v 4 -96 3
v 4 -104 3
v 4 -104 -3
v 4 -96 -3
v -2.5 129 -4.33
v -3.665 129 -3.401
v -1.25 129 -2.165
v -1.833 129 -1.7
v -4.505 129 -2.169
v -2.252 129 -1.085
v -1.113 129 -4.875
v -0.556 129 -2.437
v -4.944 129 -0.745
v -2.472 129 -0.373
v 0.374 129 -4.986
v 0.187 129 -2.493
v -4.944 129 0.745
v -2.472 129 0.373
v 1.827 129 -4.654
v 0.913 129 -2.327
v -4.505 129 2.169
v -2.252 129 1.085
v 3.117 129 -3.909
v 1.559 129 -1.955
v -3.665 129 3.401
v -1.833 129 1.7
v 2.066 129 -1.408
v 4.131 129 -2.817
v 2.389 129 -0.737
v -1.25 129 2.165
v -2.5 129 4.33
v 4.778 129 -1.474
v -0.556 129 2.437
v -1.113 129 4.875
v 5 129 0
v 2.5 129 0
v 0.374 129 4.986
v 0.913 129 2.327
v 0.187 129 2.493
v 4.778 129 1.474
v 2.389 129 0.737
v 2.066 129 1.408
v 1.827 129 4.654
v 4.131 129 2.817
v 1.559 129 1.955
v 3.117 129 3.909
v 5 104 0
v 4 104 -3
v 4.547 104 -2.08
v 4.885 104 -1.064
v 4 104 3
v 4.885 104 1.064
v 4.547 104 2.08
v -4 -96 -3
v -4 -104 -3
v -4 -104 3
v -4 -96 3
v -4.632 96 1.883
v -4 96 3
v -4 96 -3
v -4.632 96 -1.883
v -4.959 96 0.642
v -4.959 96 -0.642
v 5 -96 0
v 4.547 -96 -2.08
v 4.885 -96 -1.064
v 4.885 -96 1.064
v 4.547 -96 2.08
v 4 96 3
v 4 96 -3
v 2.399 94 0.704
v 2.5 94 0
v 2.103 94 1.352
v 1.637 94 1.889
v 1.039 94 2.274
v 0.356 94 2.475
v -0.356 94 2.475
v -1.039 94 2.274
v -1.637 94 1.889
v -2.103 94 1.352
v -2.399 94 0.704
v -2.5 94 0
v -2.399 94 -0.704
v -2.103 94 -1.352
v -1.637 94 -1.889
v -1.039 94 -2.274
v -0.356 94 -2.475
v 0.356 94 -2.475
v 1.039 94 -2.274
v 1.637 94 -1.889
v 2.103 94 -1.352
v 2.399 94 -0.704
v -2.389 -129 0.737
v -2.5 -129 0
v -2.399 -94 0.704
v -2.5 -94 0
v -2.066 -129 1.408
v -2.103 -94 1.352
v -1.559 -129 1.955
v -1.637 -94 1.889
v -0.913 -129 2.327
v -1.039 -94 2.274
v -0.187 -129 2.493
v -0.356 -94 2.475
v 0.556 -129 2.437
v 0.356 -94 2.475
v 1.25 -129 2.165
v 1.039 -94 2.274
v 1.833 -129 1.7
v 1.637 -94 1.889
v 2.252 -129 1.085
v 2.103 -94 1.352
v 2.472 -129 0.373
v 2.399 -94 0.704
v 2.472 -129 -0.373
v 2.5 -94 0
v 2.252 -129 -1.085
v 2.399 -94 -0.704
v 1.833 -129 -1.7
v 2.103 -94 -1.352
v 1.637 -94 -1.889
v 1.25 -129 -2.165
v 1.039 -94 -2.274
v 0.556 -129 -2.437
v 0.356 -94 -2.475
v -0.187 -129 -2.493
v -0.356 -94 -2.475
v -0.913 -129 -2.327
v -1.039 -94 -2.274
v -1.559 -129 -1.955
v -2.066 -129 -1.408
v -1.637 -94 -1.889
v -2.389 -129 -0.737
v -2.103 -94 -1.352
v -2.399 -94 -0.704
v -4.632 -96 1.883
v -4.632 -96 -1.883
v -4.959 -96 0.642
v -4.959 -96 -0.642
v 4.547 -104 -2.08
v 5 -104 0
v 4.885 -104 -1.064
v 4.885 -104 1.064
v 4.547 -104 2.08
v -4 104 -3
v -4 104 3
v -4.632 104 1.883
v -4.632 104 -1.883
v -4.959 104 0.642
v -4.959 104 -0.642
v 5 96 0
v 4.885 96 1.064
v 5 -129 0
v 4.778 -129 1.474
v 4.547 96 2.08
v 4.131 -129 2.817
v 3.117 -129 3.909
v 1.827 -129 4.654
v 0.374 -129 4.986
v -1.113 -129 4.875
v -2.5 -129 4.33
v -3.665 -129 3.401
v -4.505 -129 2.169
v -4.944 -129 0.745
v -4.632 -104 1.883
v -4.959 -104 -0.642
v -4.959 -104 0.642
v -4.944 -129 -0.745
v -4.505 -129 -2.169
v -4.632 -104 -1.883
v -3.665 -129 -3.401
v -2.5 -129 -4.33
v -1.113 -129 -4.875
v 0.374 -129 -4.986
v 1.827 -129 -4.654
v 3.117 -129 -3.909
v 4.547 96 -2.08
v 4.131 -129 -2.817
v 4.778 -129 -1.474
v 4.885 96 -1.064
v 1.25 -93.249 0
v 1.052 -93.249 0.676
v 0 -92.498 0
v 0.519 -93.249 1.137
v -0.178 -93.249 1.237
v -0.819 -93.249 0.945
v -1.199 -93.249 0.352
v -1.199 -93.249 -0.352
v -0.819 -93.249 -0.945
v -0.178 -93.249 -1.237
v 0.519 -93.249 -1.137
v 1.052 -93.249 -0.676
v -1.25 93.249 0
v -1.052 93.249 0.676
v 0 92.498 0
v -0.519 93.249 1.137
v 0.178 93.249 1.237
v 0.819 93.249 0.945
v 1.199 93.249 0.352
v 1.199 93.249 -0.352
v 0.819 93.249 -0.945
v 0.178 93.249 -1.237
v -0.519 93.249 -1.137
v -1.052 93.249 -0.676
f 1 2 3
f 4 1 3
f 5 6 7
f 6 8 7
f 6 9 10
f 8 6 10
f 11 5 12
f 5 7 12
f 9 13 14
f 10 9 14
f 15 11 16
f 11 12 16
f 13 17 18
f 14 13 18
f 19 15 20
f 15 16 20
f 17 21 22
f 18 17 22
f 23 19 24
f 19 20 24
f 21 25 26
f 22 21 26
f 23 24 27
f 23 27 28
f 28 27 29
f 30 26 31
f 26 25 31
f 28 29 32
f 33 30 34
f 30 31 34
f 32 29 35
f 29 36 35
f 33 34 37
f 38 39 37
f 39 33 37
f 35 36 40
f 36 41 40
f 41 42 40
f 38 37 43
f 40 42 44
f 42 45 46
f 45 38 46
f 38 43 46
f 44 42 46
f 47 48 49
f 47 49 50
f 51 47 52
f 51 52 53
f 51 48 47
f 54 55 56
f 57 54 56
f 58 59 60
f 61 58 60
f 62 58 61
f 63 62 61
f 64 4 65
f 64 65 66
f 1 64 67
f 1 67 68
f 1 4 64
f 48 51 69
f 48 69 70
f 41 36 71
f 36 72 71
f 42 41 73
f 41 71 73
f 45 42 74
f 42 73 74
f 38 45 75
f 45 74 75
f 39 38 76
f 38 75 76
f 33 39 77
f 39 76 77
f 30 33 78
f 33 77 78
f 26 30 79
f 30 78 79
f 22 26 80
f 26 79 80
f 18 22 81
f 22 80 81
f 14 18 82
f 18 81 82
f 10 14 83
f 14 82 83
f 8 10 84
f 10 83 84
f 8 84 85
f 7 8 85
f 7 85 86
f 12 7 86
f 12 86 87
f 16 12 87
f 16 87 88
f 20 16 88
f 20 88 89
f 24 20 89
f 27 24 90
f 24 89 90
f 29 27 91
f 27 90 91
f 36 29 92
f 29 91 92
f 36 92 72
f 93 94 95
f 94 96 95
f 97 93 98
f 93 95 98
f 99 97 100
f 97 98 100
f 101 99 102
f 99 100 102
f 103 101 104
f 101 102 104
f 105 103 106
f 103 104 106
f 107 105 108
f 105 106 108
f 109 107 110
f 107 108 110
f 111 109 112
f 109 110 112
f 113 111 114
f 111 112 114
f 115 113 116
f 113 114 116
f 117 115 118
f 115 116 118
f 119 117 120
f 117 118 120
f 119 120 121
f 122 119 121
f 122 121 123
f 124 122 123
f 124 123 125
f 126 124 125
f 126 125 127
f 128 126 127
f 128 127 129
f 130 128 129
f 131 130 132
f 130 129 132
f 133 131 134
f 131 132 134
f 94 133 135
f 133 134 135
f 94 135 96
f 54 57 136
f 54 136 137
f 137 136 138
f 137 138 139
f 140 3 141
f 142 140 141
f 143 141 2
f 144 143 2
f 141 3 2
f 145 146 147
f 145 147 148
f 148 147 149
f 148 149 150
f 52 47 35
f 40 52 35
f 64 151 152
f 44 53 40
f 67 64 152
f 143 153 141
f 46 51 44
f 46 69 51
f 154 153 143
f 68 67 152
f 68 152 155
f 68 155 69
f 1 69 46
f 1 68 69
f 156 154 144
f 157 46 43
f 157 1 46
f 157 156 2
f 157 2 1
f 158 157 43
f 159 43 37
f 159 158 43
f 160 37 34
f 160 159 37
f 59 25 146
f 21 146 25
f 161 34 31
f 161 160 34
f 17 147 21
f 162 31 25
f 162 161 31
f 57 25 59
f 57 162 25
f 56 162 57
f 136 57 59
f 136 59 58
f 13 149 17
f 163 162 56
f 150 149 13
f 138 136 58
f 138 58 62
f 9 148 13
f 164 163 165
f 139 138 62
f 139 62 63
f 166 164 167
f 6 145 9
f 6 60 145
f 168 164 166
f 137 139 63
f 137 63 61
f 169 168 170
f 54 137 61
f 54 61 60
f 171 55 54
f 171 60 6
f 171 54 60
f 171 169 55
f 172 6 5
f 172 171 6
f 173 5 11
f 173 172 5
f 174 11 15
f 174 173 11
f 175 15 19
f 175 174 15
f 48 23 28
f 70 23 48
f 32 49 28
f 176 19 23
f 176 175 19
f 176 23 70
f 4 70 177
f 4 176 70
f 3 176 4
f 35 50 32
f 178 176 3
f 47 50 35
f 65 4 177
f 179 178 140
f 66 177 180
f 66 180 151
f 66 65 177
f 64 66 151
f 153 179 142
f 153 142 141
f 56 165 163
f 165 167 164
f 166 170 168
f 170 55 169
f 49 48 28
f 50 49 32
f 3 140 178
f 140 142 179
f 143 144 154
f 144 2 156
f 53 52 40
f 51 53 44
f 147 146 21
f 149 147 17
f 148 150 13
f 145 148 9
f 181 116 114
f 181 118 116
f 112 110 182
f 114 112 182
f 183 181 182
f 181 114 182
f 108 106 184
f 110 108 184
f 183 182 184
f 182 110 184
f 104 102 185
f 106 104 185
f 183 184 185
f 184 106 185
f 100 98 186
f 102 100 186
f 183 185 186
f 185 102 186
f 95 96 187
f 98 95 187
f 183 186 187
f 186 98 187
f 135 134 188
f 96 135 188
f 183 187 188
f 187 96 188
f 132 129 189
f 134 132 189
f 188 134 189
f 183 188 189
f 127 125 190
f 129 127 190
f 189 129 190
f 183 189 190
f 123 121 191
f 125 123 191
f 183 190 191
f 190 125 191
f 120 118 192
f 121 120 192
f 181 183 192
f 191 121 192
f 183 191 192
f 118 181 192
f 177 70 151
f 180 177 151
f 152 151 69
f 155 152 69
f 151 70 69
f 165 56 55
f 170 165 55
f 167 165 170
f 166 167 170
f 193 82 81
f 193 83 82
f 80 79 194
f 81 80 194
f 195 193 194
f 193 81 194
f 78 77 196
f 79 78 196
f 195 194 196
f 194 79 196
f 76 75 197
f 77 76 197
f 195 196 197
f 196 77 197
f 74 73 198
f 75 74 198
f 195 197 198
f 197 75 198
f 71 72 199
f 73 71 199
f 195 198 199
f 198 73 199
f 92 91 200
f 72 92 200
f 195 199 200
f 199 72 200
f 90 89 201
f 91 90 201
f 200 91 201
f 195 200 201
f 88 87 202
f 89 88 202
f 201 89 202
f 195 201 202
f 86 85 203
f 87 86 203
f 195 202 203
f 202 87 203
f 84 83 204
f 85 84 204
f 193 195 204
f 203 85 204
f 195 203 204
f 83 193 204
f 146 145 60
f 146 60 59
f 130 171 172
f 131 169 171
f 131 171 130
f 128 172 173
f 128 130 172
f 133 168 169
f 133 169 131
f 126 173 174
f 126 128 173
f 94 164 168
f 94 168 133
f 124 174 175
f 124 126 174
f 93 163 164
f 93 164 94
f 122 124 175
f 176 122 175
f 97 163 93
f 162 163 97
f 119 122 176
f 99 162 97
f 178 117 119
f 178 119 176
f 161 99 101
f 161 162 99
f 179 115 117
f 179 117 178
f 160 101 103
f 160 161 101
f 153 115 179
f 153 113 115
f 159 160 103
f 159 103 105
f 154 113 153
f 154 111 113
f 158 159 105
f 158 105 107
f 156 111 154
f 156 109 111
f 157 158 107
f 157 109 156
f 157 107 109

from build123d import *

# Parameters (mm, degrees)
F0_R     = 5
F1_DEPTH = 129
F3_D     = 5
F3_DEPTH = 35
F3_TIP   = 1.5021515476
F5_D     = 5
F5_DEPTH = 35
F5_TIP   = 1.5021515476
F8_DEPTH = 8


# Not quite as in the source:
# - a pattern or mirror of a feature is missing from the dataset's text; its kind, count and spacing are read off the source's solid


with BuildPart() as f1:
    # F0 (on Front) → F1 (new body, symmetric)
    with BuildSketch(Plane.XZ):
        Circle(F0_R)
    extrude(amount=F1_DEPTH, both=True)

    # F3
    with Locations(Plane.XZ.offset(129)):
        with Locations((0, 0)):
            Hole(F3_D / 2, depth=F3_DEPTH)
            with Locations((0, 0, -(F3_DEPTH + F3_TIP / 2))):  # 118° drill point
                Cone(0, F3_D / 2, F3_TIP, mode=Mode.SUBTRACT)

    # F5
    with Locations(Plane(origin=(0, 129, 0), x_dir=(-1, 0, 0), z_dir=(0, 1, 0))):
        with Locations((0, 0)):
            Hole(F5_D / 2, depth=F5_DEPTH)
            with Locations((0, 0, -(F5_DEPTH + F5_TIP / 2))):  # 118° drill point
                Cone(0, F5_D / 2, F5_TIP, mode=Mode.SUBTRACT)

    # F7 (on offset) → F8 (cut)
    with BuildSketch(Plane.XZ.offset(104)):
        with BuildLine():
            Line((-4, -3), (-4, 3))
            ThreePointArc((-4, 3), (-5, 0), (-4, -3))
        make_face()
        with BuildLine():
            ThreePointArc((5, 0), (4.7434164903, 1.5811388301), (4, 3))
            Line((4, 3), (4, -3))
            ThreePointArc((4, -3), (4.7434164903, -1.5811388301), (5, 0))
        make_face()
    f8 = extrude(amount=-F8_DEPTH, mode=Mode.SUBTRACT)

    # F8_copies: F8 across plane
    add(f8.mirror(Plane.ZX), mode=Mode.SUBTRACT)


solid = f1.part
